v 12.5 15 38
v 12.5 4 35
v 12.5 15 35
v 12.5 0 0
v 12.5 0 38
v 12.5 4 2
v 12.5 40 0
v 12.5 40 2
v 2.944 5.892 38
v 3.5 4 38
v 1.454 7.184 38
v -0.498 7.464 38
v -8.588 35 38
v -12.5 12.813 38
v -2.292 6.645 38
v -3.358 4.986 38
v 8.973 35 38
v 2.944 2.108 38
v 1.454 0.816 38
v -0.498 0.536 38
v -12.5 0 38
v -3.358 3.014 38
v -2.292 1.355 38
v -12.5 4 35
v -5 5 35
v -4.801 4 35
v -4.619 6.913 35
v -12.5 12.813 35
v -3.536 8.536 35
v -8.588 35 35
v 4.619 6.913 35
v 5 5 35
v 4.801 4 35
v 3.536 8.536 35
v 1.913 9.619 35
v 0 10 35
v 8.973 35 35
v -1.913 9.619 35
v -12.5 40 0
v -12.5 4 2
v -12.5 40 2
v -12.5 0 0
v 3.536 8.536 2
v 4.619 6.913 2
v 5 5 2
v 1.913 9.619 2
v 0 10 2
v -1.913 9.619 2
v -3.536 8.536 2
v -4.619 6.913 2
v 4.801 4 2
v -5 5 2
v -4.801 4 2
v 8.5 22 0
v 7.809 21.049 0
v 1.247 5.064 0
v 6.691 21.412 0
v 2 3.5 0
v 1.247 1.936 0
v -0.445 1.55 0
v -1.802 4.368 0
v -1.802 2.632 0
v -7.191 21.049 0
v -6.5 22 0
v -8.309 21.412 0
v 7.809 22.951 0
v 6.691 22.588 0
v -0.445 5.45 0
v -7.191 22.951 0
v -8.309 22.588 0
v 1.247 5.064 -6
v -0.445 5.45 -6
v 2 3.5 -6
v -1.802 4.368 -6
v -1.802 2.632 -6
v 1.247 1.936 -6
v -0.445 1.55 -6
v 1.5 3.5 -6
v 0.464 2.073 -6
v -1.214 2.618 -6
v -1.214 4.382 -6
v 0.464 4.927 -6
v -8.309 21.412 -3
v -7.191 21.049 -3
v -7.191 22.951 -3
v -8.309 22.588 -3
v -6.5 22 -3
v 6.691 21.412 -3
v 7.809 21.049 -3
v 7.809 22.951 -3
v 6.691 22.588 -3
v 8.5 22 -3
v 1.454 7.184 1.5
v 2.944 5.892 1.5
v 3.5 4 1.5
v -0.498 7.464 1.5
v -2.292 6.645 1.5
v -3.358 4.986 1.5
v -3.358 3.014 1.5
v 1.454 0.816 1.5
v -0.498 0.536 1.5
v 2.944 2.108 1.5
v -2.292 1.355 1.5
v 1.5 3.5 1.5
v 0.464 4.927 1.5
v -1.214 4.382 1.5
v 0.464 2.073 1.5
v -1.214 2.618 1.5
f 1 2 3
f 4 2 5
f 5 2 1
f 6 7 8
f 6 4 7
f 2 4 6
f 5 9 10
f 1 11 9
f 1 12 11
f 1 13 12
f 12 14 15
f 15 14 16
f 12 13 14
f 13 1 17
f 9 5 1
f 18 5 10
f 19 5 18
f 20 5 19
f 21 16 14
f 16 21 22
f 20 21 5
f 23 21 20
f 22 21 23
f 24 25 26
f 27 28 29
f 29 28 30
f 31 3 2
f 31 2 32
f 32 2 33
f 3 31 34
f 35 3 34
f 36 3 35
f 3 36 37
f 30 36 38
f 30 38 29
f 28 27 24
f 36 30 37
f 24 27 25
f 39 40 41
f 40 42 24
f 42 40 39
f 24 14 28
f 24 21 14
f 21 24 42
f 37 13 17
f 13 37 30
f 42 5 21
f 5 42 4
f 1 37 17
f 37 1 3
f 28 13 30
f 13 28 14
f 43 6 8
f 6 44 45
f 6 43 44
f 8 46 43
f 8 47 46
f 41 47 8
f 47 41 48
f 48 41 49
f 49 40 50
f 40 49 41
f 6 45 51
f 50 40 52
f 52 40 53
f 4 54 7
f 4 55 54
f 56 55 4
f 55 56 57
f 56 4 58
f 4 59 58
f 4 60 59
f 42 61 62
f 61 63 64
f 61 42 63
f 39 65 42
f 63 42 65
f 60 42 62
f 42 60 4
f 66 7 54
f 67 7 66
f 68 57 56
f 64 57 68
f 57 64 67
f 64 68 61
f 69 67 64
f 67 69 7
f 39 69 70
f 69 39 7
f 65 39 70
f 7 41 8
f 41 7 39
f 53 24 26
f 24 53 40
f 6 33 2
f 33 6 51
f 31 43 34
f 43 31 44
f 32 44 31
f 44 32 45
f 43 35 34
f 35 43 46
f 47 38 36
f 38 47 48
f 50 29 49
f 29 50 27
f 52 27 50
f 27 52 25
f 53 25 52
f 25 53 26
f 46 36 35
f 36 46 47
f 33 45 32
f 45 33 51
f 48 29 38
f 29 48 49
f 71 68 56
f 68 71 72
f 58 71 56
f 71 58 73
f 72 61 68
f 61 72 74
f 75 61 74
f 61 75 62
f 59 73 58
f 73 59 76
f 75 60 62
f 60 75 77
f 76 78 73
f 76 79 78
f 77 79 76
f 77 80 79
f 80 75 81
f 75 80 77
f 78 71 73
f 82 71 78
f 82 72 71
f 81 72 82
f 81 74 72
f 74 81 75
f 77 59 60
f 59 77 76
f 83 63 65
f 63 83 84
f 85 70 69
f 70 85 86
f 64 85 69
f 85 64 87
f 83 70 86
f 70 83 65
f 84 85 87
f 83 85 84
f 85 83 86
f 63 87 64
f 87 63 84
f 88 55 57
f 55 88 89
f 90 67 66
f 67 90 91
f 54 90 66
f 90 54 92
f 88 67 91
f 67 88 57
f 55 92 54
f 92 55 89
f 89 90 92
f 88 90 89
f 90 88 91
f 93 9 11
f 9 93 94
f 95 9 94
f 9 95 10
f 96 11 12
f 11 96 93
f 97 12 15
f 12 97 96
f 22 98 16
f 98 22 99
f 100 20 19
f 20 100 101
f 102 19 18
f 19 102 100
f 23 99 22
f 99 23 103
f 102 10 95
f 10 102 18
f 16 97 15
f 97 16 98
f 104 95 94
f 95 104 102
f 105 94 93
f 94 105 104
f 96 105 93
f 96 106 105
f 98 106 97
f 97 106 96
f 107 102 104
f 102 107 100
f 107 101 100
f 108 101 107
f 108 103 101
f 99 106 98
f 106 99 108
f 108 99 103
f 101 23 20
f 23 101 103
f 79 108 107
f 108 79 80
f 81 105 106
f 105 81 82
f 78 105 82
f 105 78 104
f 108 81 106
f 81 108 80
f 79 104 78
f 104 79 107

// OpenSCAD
difference(){
union(){    
translate([-12.5,0,0])    
    cube([25,40,2]);
translate([-12.5,0,0])  
    cube([25,4,35]);
translate([-12.5,0,35])
    difference() {
        cube([25, 35, 3]);
        translate([25,15,0])
            rotate([0,0,10])
                cube([25,25,3]);
        translate([-25,15,0])
            rotate([0,0,-10])
                cube([25,25,3]);
        }
translate([0,5,1])
    cylinder(h=35,r=5);       
translate([0,3.5,-6])
    cylinder(h=6,r=2);
        
translate([-7.5,22,-3])
    cylinder(h=3,r=1); 
translate([7.5,22,-3])
    cylinder(h=3,r=1);        
}
translate([0,4,1.5])
    cylinder(h=40,r=3.5);
translate([0,3.5,-8])
    cylinder(h=10,r=1.5);
}
